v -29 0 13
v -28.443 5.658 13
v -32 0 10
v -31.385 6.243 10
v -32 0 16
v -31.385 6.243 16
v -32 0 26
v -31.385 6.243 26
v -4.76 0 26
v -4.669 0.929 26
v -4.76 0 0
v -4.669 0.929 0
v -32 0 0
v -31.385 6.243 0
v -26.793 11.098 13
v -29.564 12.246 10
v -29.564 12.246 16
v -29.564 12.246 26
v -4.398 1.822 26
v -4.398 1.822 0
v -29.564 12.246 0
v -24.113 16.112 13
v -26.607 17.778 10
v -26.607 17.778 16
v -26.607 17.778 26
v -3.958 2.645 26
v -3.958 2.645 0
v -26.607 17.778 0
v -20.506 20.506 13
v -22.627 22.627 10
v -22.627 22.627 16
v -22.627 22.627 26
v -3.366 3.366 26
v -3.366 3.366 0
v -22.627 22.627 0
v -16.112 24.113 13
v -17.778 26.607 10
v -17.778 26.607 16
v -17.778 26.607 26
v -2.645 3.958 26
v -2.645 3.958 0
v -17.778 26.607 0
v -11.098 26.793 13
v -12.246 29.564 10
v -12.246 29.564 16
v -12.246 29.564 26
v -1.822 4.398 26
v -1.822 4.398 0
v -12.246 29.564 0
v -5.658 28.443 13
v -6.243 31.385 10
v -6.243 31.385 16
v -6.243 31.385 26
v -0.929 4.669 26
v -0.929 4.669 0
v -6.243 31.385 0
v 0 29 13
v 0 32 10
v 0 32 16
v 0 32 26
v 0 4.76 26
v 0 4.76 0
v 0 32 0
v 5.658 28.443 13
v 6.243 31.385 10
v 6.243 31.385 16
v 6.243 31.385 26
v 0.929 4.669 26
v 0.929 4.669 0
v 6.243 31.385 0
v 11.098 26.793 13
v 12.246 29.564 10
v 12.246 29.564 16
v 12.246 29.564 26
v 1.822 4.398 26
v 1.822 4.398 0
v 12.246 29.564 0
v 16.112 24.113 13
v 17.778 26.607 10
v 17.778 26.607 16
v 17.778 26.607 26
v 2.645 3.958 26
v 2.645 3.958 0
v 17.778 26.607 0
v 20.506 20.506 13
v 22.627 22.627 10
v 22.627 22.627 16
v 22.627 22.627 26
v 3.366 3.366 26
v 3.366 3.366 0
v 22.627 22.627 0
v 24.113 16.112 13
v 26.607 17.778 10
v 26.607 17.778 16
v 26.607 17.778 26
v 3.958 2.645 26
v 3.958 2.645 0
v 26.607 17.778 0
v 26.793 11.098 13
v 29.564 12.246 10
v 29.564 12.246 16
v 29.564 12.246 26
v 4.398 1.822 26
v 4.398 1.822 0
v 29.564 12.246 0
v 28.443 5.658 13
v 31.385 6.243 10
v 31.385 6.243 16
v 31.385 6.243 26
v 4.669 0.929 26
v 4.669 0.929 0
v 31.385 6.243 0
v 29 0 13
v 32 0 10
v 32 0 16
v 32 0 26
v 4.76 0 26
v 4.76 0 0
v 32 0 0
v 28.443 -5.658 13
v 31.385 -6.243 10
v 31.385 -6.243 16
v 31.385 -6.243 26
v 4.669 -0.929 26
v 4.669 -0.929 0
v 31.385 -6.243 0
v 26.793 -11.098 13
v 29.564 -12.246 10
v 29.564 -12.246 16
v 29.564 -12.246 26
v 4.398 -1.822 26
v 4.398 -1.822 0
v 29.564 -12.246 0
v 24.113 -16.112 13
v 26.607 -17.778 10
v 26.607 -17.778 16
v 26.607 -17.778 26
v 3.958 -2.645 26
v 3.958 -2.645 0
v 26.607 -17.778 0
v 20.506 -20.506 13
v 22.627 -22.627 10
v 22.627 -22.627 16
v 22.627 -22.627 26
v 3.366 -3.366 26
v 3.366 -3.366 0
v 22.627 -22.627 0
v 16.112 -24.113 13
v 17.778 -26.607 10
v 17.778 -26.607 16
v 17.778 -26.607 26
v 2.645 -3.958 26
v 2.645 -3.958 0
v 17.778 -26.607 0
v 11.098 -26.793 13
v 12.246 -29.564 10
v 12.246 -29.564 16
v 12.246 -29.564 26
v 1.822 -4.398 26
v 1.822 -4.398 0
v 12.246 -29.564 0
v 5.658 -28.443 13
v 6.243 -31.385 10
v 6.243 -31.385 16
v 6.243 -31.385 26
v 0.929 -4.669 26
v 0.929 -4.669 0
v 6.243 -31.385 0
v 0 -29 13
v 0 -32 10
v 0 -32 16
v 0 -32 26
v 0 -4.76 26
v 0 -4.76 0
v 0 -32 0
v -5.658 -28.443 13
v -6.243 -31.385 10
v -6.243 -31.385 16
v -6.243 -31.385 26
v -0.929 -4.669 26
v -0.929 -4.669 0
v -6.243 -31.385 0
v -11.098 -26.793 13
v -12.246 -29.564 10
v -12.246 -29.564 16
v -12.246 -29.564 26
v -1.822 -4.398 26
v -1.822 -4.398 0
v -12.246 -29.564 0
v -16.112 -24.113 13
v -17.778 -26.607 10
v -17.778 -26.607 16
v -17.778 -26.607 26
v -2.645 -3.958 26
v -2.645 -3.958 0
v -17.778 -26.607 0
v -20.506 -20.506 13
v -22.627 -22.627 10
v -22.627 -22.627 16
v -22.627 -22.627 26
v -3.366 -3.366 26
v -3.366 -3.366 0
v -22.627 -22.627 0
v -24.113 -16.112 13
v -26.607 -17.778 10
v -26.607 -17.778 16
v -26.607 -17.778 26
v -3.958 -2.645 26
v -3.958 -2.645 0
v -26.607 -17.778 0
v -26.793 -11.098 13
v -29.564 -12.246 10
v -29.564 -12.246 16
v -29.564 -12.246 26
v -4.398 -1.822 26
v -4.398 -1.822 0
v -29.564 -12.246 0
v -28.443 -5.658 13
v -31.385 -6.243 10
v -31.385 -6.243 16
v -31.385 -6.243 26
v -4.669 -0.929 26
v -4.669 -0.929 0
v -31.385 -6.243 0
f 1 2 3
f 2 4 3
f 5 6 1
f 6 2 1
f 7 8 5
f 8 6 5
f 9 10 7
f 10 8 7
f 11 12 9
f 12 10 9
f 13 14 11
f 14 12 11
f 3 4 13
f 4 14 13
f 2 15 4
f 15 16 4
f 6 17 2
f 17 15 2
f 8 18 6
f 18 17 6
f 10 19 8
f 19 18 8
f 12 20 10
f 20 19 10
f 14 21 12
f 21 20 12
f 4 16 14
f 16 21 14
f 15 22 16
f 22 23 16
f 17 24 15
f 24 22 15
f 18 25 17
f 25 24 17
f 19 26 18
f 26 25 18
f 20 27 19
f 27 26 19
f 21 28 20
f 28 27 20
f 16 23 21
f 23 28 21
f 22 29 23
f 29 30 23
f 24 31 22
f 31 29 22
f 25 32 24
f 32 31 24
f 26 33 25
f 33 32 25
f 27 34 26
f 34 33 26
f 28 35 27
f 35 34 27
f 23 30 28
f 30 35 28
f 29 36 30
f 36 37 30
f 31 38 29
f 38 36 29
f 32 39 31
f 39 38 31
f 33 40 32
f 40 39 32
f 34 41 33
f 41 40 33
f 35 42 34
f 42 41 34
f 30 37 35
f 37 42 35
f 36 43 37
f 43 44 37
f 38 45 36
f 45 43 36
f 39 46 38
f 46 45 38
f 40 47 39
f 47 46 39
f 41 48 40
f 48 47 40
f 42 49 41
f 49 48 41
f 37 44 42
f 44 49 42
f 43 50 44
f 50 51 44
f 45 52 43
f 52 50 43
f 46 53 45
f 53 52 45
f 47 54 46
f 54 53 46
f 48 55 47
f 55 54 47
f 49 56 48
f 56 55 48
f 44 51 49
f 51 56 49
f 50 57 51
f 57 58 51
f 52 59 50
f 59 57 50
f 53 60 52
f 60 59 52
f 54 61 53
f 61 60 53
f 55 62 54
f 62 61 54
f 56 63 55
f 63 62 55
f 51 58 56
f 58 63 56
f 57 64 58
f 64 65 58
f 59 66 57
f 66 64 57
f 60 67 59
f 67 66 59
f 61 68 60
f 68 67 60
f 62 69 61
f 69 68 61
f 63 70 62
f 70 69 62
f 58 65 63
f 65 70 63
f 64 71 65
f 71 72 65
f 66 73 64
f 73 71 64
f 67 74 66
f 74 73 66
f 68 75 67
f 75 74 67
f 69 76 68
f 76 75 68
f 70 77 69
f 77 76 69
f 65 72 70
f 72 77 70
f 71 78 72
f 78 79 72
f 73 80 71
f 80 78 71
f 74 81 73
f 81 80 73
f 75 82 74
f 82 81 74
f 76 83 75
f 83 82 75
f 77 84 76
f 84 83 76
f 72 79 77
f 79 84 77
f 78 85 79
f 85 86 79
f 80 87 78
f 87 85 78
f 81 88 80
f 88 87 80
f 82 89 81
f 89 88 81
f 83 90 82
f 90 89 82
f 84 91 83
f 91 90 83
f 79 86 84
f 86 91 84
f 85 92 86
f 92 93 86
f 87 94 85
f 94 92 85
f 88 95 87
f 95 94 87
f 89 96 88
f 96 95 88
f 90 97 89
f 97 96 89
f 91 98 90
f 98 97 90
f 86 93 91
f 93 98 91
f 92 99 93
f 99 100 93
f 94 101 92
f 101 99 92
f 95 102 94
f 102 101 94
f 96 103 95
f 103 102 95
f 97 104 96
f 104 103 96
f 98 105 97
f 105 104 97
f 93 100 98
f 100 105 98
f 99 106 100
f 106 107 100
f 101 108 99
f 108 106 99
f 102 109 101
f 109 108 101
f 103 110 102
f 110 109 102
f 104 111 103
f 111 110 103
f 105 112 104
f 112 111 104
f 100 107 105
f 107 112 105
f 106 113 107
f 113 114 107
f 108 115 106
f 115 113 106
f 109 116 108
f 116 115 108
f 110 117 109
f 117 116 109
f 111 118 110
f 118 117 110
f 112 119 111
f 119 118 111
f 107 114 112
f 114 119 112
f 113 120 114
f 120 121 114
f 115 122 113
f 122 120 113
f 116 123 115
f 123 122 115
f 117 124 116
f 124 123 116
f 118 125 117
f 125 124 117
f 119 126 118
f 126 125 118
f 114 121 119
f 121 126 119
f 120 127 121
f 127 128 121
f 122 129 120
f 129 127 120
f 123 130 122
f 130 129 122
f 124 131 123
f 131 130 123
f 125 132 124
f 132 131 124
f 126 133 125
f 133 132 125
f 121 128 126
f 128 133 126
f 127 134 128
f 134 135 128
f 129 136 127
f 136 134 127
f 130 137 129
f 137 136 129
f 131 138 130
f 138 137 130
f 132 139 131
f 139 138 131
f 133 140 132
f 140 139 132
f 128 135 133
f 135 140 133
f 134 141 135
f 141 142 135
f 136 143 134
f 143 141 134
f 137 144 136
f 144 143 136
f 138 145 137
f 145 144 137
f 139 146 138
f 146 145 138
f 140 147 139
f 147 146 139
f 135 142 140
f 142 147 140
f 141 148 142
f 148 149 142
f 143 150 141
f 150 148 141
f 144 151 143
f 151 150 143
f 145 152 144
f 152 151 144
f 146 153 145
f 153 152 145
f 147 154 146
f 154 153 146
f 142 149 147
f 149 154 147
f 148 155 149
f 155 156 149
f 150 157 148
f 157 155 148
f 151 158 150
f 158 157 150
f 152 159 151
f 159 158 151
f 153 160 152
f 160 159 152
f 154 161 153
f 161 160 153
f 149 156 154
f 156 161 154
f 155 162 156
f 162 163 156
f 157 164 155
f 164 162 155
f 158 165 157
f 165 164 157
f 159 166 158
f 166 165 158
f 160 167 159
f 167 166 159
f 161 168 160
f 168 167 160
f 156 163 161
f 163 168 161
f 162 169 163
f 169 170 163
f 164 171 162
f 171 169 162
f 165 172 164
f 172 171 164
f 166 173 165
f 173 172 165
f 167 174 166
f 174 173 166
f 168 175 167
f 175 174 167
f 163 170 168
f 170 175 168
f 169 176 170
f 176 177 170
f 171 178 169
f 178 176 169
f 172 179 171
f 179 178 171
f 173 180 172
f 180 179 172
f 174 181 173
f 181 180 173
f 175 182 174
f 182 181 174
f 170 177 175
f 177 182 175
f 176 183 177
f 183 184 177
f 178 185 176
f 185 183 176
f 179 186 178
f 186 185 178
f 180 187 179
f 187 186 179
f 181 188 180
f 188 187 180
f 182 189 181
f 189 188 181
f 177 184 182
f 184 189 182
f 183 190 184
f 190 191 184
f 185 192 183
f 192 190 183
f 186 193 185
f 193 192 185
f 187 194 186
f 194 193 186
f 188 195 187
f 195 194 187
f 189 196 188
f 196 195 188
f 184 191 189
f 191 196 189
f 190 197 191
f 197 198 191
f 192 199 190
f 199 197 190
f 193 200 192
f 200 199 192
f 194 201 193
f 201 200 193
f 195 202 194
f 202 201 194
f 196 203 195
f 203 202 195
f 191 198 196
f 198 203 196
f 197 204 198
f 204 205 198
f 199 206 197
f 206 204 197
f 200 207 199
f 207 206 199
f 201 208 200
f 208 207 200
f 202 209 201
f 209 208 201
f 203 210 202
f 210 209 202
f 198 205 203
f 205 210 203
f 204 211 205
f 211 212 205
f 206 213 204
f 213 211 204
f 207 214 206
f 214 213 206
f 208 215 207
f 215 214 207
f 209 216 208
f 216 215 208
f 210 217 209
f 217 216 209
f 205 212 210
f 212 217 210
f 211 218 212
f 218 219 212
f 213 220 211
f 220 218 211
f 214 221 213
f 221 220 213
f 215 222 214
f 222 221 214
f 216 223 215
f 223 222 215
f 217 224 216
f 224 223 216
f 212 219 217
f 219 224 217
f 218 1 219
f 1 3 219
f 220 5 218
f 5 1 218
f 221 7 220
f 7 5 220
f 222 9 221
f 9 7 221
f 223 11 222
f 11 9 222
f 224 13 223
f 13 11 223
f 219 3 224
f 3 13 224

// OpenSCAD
$fn = 32;

// ----------------------------------------------------------------------
// Belt roller: 64 mm barrel, 26 mm wide, bore 9.52 mm
// ----------------------------------------------------------------------

// --- parameters (mm) ---
bore_d = 9.52;            // bore
barrel_d = 64;            // barrel diameter
roller_w = 26;            // roller width
groove_w = 6;             // guide groove width
groove_d = 3;             // guide groove depth

roller_profile = [[4.76, 0], [32, 0], [32, 10], [29, 13], [32, 16], [32, 26], [4.76, 26]];

/* the profile stays clear of the axis, so the bore comes out of the revolve */
rotate_extrude() polygon(roller_profile);
